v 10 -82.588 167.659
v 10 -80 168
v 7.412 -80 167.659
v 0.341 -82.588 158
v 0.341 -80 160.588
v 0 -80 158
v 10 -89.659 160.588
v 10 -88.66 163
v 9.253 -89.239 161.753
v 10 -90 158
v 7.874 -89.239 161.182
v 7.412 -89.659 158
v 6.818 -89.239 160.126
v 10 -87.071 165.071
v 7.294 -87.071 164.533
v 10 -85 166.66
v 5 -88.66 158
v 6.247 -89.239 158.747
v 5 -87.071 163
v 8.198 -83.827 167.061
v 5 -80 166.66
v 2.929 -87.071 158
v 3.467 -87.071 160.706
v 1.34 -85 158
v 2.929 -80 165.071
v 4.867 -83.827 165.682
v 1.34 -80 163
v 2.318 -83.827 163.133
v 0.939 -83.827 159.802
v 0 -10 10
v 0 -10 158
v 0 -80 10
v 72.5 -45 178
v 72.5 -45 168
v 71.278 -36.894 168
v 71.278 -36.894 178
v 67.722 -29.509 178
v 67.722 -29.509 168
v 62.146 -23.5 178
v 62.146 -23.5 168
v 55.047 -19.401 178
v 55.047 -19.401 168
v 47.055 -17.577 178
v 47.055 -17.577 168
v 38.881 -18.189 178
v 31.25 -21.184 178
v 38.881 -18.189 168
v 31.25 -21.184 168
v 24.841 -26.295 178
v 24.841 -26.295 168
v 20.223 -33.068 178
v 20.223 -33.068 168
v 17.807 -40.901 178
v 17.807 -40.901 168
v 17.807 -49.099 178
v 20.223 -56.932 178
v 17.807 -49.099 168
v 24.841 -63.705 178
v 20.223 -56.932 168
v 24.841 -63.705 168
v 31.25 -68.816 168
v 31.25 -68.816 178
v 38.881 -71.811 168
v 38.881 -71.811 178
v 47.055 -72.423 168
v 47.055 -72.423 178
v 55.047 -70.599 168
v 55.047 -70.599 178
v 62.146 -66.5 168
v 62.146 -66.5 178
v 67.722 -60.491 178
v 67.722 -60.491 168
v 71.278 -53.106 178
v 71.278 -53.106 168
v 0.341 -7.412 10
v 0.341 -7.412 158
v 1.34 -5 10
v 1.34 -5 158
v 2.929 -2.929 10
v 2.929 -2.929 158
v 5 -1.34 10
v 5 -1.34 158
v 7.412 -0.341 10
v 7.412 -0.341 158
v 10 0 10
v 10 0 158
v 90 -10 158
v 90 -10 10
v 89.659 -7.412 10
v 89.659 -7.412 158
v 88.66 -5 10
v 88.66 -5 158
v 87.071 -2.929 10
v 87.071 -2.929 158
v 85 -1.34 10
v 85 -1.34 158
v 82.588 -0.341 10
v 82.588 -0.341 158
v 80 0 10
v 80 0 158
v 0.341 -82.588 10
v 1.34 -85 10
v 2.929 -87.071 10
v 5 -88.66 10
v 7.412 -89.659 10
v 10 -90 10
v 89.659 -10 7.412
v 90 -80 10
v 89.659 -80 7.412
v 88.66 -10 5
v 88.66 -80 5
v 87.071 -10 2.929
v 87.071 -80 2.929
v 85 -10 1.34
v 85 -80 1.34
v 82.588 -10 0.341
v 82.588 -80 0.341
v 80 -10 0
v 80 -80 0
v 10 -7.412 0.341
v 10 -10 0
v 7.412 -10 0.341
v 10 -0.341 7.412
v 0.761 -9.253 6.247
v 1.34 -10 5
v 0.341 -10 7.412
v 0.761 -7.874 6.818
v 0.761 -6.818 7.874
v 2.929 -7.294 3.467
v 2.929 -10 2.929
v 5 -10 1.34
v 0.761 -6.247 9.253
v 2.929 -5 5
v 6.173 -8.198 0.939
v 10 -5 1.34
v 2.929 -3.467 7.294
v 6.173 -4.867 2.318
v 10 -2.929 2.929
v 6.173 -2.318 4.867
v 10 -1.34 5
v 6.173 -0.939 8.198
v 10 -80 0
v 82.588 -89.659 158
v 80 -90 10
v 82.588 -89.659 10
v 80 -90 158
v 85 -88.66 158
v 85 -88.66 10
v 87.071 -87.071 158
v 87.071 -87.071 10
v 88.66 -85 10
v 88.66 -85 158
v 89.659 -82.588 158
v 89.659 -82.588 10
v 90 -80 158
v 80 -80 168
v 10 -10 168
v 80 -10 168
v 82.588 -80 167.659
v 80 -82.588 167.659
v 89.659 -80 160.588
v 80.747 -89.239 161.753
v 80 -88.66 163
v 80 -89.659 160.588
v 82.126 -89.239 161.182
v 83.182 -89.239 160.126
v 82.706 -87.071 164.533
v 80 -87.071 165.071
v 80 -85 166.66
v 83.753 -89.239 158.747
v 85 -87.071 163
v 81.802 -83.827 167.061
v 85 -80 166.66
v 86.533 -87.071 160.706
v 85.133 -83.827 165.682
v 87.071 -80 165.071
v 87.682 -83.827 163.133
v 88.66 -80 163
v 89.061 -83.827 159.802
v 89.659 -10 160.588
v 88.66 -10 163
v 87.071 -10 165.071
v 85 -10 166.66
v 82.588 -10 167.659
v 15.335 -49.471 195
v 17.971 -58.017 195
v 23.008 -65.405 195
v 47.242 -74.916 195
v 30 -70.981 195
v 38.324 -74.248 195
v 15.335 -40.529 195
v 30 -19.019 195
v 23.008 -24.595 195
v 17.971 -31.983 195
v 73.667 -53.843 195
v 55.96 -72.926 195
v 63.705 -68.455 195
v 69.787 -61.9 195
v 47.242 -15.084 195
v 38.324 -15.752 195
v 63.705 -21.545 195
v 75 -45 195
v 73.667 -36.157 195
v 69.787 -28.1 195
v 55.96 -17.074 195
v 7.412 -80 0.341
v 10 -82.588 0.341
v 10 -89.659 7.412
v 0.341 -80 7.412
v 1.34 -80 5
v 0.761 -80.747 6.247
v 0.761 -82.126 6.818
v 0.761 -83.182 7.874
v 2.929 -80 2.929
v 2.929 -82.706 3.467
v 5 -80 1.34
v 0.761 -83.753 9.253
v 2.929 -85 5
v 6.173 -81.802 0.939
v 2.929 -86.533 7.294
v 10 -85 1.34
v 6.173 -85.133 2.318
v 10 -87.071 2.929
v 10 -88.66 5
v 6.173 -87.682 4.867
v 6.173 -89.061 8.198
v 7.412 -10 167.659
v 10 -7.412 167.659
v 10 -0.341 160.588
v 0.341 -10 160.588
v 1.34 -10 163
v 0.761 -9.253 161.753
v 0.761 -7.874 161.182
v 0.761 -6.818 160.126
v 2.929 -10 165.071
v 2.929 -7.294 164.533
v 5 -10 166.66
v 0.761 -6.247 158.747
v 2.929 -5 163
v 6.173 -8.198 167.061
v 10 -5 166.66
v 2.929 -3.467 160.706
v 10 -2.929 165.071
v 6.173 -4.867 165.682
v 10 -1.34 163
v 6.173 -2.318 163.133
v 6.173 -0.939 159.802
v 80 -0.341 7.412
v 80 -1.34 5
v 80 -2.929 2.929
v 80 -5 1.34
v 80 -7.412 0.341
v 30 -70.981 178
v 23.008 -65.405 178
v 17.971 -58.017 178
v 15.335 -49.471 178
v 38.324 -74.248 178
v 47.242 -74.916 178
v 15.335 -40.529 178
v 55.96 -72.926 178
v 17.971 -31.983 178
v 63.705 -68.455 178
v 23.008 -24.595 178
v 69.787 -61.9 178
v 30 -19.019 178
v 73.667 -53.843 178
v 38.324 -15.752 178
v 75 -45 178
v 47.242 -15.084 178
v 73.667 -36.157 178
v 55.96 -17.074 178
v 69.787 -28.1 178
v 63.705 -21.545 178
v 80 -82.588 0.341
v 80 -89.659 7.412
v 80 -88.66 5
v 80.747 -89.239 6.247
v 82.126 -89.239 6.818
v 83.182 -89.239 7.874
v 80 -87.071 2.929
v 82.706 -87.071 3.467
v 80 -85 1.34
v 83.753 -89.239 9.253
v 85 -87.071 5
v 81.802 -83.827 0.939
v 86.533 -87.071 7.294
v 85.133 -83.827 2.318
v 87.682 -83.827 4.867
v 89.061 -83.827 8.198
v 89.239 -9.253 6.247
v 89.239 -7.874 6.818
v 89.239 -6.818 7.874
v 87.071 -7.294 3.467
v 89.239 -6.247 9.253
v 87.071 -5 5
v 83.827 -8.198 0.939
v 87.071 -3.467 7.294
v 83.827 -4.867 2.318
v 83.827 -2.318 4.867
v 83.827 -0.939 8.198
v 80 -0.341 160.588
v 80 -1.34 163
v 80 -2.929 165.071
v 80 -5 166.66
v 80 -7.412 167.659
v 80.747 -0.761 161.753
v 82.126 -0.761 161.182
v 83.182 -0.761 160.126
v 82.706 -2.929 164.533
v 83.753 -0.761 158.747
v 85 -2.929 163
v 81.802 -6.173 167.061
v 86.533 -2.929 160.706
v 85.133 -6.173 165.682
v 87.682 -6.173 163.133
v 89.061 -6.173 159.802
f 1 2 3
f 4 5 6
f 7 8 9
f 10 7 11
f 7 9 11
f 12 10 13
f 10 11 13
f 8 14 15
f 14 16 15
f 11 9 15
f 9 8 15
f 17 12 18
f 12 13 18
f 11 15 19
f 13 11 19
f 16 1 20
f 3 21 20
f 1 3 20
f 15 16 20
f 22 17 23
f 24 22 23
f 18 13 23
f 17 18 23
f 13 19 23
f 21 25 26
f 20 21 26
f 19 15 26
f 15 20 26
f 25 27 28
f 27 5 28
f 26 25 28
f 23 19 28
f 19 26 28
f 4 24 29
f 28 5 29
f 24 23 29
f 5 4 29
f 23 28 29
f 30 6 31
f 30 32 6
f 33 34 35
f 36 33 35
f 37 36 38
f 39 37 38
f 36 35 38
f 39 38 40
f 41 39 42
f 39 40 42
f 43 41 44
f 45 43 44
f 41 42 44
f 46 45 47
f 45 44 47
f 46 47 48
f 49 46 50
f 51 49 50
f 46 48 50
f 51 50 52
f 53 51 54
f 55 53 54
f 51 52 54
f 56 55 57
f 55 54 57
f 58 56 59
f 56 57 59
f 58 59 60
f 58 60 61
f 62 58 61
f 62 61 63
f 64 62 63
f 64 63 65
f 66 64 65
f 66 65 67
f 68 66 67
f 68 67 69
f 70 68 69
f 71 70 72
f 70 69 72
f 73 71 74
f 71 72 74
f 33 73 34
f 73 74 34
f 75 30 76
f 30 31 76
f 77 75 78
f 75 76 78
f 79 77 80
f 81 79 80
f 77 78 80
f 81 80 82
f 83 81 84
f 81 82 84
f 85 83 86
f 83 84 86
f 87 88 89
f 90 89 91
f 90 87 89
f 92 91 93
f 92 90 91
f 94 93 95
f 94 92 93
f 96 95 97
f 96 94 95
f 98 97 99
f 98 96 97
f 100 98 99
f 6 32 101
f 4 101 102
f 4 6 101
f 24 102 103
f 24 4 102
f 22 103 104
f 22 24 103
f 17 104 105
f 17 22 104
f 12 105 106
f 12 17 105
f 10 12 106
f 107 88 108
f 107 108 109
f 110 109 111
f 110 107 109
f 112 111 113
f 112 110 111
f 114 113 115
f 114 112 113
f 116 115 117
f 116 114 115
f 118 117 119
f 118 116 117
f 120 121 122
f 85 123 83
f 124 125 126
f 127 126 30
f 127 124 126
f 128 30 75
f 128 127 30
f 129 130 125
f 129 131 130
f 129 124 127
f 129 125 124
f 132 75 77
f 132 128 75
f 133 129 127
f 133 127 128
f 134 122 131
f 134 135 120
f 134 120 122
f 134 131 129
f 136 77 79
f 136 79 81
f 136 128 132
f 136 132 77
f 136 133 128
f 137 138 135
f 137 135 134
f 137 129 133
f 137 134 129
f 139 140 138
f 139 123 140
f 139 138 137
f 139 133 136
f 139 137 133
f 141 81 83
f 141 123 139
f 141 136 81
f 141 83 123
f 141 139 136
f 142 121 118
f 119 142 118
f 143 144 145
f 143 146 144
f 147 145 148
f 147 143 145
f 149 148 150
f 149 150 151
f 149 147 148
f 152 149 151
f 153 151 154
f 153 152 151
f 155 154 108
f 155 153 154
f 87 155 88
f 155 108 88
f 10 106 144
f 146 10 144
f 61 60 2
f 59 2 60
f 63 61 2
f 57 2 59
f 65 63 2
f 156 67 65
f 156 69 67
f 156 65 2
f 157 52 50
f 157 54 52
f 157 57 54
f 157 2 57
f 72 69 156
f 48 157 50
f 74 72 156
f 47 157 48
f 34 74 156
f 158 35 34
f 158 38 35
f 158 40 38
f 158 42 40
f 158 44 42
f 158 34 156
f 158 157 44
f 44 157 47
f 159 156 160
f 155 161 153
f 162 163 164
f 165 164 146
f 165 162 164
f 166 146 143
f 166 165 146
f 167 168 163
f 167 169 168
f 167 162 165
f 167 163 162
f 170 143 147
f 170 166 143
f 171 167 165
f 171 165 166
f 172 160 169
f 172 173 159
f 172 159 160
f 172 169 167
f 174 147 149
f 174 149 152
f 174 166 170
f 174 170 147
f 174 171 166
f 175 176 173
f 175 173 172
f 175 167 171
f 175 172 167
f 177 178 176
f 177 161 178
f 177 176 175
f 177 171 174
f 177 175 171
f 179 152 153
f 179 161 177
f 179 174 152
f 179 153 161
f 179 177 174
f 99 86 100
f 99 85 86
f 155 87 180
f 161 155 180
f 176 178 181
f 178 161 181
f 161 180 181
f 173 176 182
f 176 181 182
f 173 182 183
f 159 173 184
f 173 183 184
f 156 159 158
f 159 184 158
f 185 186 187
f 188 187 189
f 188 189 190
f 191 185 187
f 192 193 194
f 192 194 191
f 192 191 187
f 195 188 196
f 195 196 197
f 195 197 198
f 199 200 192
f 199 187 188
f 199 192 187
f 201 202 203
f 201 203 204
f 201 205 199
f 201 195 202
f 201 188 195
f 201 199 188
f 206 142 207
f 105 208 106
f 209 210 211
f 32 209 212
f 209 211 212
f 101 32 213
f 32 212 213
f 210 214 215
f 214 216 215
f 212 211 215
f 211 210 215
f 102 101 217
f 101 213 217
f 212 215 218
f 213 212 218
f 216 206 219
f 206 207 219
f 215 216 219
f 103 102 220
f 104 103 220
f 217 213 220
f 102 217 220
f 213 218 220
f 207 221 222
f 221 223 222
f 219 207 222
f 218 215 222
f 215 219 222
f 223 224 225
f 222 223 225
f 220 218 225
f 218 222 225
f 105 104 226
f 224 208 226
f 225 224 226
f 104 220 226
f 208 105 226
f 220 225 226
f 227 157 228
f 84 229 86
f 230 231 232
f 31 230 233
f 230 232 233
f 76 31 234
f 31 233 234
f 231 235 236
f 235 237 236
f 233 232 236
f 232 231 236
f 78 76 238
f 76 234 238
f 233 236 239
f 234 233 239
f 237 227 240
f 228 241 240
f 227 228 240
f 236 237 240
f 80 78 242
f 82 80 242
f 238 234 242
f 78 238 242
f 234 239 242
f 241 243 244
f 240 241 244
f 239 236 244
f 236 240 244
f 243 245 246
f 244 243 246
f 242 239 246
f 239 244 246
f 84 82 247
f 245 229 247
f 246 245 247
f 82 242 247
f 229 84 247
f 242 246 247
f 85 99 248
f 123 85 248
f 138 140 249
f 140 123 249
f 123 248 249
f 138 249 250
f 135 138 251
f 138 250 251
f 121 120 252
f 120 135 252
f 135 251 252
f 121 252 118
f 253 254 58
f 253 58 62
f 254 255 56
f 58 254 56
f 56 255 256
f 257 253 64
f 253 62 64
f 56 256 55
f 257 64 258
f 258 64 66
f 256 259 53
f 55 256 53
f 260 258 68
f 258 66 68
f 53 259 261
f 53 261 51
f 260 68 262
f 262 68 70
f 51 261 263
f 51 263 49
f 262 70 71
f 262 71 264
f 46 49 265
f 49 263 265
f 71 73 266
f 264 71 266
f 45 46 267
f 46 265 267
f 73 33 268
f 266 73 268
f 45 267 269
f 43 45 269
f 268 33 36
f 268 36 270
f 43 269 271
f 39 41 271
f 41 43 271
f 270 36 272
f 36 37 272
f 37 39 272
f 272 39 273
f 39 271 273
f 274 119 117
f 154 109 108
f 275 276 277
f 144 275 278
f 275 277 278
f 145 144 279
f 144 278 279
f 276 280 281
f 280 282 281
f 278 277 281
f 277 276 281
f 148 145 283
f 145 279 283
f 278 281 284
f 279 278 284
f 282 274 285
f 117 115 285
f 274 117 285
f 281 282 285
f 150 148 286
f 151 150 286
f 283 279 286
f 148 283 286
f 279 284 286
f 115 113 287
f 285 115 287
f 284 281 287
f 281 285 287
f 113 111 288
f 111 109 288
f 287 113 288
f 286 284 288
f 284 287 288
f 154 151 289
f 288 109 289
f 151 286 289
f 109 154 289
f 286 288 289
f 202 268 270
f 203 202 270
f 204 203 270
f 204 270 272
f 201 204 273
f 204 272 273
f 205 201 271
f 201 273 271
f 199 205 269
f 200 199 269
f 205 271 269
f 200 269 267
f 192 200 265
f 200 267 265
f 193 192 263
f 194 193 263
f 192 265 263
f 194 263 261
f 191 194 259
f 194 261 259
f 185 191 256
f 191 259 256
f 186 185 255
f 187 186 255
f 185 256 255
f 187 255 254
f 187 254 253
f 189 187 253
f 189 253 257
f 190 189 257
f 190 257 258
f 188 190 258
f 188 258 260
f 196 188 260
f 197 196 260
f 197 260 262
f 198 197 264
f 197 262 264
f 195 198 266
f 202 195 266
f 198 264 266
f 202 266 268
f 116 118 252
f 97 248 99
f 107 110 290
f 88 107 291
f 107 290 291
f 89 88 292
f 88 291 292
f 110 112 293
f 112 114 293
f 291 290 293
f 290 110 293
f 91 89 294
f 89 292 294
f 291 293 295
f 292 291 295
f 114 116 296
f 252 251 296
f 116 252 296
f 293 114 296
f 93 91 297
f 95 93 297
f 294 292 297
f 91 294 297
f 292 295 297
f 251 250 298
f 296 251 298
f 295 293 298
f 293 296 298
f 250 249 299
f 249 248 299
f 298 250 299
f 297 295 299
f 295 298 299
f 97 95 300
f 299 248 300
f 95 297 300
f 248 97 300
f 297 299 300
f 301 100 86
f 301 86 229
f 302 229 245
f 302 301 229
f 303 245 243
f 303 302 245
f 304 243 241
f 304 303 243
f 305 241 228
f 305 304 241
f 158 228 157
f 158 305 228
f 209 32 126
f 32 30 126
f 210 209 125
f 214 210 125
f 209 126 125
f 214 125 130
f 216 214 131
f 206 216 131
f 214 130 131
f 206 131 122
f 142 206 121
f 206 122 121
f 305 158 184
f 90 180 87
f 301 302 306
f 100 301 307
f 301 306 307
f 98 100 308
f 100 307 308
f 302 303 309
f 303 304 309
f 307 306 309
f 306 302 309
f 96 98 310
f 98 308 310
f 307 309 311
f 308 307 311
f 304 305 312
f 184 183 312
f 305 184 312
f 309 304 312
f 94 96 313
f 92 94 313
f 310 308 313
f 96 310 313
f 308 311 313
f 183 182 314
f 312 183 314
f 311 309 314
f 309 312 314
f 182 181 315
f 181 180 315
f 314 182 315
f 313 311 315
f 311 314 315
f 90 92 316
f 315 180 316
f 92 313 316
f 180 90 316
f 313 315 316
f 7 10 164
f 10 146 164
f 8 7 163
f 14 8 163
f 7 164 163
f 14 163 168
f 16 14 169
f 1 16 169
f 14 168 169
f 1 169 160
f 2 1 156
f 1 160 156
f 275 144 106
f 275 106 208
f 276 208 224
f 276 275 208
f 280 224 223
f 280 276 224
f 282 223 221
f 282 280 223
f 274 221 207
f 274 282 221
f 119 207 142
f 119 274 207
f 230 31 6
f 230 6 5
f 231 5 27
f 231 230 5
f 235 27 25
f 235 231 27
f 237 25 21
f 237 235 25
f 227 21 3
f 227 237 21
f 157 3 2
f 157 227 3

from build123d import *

# Parameters (mm, degrees)
SKETCH_1_W      = 90
SKETCH_1_H      = 90
EXTRUDE_1_DEPTH = 168
FILLET_1_R      = 10
SKETCH_2_R      = 27.5
EXTRUDE_2_DEPTH = 10
SKETCH_3_R      = 30
EXTRUDE_3_DEPTH = 17


with BuildPart() as part:
    # 스케치1 → 보스-돌출1 (new body)
    with BuildSketch(Plane.XY):
        with Locations((45, -45)):
            Rectangle(SKETCH_1_W, SKETCH_1_H)
    extrude(amount=EXTRUDE_1_DEPTH)

    # 필렛1
    fillet_1_edges = [part.edges().sort_by_distance(p)[0] for p in [
        (90, -45, 168),
        (45, 0, 168),
        (0, -45, 168),
        (45, 0, 0),
        (90, -45, 0),
        (45, -90, 0),
        (0, -45, 0),
        (45, -90, 168),
        (0, 0, 84),
        (90, 0, 84),
        (90, -90, 84),
        (0, -90, 84),
    ]]
    fillet(fillet_1_edges, radius=FILLET_1_R)

    # 스케치2 → 보스-돌출2 (add)
    with BuildSketch(Plane.XY.offset(168)):
        with Locations((45, -45)):
            Circle(SKETCH_2_R)
    extrude(amount=EXTRUDE_2_DEPTH)

    # 스케치3 → 보스-돌출3 (add)
    with BuildSketch(Plane.XY.offset(178)):
        with Locations((45, -45)):
            Circle(SKETCH_3_R)
    extrude(amount=EXTRUDE_3_DEPTH)


solid = part.part
